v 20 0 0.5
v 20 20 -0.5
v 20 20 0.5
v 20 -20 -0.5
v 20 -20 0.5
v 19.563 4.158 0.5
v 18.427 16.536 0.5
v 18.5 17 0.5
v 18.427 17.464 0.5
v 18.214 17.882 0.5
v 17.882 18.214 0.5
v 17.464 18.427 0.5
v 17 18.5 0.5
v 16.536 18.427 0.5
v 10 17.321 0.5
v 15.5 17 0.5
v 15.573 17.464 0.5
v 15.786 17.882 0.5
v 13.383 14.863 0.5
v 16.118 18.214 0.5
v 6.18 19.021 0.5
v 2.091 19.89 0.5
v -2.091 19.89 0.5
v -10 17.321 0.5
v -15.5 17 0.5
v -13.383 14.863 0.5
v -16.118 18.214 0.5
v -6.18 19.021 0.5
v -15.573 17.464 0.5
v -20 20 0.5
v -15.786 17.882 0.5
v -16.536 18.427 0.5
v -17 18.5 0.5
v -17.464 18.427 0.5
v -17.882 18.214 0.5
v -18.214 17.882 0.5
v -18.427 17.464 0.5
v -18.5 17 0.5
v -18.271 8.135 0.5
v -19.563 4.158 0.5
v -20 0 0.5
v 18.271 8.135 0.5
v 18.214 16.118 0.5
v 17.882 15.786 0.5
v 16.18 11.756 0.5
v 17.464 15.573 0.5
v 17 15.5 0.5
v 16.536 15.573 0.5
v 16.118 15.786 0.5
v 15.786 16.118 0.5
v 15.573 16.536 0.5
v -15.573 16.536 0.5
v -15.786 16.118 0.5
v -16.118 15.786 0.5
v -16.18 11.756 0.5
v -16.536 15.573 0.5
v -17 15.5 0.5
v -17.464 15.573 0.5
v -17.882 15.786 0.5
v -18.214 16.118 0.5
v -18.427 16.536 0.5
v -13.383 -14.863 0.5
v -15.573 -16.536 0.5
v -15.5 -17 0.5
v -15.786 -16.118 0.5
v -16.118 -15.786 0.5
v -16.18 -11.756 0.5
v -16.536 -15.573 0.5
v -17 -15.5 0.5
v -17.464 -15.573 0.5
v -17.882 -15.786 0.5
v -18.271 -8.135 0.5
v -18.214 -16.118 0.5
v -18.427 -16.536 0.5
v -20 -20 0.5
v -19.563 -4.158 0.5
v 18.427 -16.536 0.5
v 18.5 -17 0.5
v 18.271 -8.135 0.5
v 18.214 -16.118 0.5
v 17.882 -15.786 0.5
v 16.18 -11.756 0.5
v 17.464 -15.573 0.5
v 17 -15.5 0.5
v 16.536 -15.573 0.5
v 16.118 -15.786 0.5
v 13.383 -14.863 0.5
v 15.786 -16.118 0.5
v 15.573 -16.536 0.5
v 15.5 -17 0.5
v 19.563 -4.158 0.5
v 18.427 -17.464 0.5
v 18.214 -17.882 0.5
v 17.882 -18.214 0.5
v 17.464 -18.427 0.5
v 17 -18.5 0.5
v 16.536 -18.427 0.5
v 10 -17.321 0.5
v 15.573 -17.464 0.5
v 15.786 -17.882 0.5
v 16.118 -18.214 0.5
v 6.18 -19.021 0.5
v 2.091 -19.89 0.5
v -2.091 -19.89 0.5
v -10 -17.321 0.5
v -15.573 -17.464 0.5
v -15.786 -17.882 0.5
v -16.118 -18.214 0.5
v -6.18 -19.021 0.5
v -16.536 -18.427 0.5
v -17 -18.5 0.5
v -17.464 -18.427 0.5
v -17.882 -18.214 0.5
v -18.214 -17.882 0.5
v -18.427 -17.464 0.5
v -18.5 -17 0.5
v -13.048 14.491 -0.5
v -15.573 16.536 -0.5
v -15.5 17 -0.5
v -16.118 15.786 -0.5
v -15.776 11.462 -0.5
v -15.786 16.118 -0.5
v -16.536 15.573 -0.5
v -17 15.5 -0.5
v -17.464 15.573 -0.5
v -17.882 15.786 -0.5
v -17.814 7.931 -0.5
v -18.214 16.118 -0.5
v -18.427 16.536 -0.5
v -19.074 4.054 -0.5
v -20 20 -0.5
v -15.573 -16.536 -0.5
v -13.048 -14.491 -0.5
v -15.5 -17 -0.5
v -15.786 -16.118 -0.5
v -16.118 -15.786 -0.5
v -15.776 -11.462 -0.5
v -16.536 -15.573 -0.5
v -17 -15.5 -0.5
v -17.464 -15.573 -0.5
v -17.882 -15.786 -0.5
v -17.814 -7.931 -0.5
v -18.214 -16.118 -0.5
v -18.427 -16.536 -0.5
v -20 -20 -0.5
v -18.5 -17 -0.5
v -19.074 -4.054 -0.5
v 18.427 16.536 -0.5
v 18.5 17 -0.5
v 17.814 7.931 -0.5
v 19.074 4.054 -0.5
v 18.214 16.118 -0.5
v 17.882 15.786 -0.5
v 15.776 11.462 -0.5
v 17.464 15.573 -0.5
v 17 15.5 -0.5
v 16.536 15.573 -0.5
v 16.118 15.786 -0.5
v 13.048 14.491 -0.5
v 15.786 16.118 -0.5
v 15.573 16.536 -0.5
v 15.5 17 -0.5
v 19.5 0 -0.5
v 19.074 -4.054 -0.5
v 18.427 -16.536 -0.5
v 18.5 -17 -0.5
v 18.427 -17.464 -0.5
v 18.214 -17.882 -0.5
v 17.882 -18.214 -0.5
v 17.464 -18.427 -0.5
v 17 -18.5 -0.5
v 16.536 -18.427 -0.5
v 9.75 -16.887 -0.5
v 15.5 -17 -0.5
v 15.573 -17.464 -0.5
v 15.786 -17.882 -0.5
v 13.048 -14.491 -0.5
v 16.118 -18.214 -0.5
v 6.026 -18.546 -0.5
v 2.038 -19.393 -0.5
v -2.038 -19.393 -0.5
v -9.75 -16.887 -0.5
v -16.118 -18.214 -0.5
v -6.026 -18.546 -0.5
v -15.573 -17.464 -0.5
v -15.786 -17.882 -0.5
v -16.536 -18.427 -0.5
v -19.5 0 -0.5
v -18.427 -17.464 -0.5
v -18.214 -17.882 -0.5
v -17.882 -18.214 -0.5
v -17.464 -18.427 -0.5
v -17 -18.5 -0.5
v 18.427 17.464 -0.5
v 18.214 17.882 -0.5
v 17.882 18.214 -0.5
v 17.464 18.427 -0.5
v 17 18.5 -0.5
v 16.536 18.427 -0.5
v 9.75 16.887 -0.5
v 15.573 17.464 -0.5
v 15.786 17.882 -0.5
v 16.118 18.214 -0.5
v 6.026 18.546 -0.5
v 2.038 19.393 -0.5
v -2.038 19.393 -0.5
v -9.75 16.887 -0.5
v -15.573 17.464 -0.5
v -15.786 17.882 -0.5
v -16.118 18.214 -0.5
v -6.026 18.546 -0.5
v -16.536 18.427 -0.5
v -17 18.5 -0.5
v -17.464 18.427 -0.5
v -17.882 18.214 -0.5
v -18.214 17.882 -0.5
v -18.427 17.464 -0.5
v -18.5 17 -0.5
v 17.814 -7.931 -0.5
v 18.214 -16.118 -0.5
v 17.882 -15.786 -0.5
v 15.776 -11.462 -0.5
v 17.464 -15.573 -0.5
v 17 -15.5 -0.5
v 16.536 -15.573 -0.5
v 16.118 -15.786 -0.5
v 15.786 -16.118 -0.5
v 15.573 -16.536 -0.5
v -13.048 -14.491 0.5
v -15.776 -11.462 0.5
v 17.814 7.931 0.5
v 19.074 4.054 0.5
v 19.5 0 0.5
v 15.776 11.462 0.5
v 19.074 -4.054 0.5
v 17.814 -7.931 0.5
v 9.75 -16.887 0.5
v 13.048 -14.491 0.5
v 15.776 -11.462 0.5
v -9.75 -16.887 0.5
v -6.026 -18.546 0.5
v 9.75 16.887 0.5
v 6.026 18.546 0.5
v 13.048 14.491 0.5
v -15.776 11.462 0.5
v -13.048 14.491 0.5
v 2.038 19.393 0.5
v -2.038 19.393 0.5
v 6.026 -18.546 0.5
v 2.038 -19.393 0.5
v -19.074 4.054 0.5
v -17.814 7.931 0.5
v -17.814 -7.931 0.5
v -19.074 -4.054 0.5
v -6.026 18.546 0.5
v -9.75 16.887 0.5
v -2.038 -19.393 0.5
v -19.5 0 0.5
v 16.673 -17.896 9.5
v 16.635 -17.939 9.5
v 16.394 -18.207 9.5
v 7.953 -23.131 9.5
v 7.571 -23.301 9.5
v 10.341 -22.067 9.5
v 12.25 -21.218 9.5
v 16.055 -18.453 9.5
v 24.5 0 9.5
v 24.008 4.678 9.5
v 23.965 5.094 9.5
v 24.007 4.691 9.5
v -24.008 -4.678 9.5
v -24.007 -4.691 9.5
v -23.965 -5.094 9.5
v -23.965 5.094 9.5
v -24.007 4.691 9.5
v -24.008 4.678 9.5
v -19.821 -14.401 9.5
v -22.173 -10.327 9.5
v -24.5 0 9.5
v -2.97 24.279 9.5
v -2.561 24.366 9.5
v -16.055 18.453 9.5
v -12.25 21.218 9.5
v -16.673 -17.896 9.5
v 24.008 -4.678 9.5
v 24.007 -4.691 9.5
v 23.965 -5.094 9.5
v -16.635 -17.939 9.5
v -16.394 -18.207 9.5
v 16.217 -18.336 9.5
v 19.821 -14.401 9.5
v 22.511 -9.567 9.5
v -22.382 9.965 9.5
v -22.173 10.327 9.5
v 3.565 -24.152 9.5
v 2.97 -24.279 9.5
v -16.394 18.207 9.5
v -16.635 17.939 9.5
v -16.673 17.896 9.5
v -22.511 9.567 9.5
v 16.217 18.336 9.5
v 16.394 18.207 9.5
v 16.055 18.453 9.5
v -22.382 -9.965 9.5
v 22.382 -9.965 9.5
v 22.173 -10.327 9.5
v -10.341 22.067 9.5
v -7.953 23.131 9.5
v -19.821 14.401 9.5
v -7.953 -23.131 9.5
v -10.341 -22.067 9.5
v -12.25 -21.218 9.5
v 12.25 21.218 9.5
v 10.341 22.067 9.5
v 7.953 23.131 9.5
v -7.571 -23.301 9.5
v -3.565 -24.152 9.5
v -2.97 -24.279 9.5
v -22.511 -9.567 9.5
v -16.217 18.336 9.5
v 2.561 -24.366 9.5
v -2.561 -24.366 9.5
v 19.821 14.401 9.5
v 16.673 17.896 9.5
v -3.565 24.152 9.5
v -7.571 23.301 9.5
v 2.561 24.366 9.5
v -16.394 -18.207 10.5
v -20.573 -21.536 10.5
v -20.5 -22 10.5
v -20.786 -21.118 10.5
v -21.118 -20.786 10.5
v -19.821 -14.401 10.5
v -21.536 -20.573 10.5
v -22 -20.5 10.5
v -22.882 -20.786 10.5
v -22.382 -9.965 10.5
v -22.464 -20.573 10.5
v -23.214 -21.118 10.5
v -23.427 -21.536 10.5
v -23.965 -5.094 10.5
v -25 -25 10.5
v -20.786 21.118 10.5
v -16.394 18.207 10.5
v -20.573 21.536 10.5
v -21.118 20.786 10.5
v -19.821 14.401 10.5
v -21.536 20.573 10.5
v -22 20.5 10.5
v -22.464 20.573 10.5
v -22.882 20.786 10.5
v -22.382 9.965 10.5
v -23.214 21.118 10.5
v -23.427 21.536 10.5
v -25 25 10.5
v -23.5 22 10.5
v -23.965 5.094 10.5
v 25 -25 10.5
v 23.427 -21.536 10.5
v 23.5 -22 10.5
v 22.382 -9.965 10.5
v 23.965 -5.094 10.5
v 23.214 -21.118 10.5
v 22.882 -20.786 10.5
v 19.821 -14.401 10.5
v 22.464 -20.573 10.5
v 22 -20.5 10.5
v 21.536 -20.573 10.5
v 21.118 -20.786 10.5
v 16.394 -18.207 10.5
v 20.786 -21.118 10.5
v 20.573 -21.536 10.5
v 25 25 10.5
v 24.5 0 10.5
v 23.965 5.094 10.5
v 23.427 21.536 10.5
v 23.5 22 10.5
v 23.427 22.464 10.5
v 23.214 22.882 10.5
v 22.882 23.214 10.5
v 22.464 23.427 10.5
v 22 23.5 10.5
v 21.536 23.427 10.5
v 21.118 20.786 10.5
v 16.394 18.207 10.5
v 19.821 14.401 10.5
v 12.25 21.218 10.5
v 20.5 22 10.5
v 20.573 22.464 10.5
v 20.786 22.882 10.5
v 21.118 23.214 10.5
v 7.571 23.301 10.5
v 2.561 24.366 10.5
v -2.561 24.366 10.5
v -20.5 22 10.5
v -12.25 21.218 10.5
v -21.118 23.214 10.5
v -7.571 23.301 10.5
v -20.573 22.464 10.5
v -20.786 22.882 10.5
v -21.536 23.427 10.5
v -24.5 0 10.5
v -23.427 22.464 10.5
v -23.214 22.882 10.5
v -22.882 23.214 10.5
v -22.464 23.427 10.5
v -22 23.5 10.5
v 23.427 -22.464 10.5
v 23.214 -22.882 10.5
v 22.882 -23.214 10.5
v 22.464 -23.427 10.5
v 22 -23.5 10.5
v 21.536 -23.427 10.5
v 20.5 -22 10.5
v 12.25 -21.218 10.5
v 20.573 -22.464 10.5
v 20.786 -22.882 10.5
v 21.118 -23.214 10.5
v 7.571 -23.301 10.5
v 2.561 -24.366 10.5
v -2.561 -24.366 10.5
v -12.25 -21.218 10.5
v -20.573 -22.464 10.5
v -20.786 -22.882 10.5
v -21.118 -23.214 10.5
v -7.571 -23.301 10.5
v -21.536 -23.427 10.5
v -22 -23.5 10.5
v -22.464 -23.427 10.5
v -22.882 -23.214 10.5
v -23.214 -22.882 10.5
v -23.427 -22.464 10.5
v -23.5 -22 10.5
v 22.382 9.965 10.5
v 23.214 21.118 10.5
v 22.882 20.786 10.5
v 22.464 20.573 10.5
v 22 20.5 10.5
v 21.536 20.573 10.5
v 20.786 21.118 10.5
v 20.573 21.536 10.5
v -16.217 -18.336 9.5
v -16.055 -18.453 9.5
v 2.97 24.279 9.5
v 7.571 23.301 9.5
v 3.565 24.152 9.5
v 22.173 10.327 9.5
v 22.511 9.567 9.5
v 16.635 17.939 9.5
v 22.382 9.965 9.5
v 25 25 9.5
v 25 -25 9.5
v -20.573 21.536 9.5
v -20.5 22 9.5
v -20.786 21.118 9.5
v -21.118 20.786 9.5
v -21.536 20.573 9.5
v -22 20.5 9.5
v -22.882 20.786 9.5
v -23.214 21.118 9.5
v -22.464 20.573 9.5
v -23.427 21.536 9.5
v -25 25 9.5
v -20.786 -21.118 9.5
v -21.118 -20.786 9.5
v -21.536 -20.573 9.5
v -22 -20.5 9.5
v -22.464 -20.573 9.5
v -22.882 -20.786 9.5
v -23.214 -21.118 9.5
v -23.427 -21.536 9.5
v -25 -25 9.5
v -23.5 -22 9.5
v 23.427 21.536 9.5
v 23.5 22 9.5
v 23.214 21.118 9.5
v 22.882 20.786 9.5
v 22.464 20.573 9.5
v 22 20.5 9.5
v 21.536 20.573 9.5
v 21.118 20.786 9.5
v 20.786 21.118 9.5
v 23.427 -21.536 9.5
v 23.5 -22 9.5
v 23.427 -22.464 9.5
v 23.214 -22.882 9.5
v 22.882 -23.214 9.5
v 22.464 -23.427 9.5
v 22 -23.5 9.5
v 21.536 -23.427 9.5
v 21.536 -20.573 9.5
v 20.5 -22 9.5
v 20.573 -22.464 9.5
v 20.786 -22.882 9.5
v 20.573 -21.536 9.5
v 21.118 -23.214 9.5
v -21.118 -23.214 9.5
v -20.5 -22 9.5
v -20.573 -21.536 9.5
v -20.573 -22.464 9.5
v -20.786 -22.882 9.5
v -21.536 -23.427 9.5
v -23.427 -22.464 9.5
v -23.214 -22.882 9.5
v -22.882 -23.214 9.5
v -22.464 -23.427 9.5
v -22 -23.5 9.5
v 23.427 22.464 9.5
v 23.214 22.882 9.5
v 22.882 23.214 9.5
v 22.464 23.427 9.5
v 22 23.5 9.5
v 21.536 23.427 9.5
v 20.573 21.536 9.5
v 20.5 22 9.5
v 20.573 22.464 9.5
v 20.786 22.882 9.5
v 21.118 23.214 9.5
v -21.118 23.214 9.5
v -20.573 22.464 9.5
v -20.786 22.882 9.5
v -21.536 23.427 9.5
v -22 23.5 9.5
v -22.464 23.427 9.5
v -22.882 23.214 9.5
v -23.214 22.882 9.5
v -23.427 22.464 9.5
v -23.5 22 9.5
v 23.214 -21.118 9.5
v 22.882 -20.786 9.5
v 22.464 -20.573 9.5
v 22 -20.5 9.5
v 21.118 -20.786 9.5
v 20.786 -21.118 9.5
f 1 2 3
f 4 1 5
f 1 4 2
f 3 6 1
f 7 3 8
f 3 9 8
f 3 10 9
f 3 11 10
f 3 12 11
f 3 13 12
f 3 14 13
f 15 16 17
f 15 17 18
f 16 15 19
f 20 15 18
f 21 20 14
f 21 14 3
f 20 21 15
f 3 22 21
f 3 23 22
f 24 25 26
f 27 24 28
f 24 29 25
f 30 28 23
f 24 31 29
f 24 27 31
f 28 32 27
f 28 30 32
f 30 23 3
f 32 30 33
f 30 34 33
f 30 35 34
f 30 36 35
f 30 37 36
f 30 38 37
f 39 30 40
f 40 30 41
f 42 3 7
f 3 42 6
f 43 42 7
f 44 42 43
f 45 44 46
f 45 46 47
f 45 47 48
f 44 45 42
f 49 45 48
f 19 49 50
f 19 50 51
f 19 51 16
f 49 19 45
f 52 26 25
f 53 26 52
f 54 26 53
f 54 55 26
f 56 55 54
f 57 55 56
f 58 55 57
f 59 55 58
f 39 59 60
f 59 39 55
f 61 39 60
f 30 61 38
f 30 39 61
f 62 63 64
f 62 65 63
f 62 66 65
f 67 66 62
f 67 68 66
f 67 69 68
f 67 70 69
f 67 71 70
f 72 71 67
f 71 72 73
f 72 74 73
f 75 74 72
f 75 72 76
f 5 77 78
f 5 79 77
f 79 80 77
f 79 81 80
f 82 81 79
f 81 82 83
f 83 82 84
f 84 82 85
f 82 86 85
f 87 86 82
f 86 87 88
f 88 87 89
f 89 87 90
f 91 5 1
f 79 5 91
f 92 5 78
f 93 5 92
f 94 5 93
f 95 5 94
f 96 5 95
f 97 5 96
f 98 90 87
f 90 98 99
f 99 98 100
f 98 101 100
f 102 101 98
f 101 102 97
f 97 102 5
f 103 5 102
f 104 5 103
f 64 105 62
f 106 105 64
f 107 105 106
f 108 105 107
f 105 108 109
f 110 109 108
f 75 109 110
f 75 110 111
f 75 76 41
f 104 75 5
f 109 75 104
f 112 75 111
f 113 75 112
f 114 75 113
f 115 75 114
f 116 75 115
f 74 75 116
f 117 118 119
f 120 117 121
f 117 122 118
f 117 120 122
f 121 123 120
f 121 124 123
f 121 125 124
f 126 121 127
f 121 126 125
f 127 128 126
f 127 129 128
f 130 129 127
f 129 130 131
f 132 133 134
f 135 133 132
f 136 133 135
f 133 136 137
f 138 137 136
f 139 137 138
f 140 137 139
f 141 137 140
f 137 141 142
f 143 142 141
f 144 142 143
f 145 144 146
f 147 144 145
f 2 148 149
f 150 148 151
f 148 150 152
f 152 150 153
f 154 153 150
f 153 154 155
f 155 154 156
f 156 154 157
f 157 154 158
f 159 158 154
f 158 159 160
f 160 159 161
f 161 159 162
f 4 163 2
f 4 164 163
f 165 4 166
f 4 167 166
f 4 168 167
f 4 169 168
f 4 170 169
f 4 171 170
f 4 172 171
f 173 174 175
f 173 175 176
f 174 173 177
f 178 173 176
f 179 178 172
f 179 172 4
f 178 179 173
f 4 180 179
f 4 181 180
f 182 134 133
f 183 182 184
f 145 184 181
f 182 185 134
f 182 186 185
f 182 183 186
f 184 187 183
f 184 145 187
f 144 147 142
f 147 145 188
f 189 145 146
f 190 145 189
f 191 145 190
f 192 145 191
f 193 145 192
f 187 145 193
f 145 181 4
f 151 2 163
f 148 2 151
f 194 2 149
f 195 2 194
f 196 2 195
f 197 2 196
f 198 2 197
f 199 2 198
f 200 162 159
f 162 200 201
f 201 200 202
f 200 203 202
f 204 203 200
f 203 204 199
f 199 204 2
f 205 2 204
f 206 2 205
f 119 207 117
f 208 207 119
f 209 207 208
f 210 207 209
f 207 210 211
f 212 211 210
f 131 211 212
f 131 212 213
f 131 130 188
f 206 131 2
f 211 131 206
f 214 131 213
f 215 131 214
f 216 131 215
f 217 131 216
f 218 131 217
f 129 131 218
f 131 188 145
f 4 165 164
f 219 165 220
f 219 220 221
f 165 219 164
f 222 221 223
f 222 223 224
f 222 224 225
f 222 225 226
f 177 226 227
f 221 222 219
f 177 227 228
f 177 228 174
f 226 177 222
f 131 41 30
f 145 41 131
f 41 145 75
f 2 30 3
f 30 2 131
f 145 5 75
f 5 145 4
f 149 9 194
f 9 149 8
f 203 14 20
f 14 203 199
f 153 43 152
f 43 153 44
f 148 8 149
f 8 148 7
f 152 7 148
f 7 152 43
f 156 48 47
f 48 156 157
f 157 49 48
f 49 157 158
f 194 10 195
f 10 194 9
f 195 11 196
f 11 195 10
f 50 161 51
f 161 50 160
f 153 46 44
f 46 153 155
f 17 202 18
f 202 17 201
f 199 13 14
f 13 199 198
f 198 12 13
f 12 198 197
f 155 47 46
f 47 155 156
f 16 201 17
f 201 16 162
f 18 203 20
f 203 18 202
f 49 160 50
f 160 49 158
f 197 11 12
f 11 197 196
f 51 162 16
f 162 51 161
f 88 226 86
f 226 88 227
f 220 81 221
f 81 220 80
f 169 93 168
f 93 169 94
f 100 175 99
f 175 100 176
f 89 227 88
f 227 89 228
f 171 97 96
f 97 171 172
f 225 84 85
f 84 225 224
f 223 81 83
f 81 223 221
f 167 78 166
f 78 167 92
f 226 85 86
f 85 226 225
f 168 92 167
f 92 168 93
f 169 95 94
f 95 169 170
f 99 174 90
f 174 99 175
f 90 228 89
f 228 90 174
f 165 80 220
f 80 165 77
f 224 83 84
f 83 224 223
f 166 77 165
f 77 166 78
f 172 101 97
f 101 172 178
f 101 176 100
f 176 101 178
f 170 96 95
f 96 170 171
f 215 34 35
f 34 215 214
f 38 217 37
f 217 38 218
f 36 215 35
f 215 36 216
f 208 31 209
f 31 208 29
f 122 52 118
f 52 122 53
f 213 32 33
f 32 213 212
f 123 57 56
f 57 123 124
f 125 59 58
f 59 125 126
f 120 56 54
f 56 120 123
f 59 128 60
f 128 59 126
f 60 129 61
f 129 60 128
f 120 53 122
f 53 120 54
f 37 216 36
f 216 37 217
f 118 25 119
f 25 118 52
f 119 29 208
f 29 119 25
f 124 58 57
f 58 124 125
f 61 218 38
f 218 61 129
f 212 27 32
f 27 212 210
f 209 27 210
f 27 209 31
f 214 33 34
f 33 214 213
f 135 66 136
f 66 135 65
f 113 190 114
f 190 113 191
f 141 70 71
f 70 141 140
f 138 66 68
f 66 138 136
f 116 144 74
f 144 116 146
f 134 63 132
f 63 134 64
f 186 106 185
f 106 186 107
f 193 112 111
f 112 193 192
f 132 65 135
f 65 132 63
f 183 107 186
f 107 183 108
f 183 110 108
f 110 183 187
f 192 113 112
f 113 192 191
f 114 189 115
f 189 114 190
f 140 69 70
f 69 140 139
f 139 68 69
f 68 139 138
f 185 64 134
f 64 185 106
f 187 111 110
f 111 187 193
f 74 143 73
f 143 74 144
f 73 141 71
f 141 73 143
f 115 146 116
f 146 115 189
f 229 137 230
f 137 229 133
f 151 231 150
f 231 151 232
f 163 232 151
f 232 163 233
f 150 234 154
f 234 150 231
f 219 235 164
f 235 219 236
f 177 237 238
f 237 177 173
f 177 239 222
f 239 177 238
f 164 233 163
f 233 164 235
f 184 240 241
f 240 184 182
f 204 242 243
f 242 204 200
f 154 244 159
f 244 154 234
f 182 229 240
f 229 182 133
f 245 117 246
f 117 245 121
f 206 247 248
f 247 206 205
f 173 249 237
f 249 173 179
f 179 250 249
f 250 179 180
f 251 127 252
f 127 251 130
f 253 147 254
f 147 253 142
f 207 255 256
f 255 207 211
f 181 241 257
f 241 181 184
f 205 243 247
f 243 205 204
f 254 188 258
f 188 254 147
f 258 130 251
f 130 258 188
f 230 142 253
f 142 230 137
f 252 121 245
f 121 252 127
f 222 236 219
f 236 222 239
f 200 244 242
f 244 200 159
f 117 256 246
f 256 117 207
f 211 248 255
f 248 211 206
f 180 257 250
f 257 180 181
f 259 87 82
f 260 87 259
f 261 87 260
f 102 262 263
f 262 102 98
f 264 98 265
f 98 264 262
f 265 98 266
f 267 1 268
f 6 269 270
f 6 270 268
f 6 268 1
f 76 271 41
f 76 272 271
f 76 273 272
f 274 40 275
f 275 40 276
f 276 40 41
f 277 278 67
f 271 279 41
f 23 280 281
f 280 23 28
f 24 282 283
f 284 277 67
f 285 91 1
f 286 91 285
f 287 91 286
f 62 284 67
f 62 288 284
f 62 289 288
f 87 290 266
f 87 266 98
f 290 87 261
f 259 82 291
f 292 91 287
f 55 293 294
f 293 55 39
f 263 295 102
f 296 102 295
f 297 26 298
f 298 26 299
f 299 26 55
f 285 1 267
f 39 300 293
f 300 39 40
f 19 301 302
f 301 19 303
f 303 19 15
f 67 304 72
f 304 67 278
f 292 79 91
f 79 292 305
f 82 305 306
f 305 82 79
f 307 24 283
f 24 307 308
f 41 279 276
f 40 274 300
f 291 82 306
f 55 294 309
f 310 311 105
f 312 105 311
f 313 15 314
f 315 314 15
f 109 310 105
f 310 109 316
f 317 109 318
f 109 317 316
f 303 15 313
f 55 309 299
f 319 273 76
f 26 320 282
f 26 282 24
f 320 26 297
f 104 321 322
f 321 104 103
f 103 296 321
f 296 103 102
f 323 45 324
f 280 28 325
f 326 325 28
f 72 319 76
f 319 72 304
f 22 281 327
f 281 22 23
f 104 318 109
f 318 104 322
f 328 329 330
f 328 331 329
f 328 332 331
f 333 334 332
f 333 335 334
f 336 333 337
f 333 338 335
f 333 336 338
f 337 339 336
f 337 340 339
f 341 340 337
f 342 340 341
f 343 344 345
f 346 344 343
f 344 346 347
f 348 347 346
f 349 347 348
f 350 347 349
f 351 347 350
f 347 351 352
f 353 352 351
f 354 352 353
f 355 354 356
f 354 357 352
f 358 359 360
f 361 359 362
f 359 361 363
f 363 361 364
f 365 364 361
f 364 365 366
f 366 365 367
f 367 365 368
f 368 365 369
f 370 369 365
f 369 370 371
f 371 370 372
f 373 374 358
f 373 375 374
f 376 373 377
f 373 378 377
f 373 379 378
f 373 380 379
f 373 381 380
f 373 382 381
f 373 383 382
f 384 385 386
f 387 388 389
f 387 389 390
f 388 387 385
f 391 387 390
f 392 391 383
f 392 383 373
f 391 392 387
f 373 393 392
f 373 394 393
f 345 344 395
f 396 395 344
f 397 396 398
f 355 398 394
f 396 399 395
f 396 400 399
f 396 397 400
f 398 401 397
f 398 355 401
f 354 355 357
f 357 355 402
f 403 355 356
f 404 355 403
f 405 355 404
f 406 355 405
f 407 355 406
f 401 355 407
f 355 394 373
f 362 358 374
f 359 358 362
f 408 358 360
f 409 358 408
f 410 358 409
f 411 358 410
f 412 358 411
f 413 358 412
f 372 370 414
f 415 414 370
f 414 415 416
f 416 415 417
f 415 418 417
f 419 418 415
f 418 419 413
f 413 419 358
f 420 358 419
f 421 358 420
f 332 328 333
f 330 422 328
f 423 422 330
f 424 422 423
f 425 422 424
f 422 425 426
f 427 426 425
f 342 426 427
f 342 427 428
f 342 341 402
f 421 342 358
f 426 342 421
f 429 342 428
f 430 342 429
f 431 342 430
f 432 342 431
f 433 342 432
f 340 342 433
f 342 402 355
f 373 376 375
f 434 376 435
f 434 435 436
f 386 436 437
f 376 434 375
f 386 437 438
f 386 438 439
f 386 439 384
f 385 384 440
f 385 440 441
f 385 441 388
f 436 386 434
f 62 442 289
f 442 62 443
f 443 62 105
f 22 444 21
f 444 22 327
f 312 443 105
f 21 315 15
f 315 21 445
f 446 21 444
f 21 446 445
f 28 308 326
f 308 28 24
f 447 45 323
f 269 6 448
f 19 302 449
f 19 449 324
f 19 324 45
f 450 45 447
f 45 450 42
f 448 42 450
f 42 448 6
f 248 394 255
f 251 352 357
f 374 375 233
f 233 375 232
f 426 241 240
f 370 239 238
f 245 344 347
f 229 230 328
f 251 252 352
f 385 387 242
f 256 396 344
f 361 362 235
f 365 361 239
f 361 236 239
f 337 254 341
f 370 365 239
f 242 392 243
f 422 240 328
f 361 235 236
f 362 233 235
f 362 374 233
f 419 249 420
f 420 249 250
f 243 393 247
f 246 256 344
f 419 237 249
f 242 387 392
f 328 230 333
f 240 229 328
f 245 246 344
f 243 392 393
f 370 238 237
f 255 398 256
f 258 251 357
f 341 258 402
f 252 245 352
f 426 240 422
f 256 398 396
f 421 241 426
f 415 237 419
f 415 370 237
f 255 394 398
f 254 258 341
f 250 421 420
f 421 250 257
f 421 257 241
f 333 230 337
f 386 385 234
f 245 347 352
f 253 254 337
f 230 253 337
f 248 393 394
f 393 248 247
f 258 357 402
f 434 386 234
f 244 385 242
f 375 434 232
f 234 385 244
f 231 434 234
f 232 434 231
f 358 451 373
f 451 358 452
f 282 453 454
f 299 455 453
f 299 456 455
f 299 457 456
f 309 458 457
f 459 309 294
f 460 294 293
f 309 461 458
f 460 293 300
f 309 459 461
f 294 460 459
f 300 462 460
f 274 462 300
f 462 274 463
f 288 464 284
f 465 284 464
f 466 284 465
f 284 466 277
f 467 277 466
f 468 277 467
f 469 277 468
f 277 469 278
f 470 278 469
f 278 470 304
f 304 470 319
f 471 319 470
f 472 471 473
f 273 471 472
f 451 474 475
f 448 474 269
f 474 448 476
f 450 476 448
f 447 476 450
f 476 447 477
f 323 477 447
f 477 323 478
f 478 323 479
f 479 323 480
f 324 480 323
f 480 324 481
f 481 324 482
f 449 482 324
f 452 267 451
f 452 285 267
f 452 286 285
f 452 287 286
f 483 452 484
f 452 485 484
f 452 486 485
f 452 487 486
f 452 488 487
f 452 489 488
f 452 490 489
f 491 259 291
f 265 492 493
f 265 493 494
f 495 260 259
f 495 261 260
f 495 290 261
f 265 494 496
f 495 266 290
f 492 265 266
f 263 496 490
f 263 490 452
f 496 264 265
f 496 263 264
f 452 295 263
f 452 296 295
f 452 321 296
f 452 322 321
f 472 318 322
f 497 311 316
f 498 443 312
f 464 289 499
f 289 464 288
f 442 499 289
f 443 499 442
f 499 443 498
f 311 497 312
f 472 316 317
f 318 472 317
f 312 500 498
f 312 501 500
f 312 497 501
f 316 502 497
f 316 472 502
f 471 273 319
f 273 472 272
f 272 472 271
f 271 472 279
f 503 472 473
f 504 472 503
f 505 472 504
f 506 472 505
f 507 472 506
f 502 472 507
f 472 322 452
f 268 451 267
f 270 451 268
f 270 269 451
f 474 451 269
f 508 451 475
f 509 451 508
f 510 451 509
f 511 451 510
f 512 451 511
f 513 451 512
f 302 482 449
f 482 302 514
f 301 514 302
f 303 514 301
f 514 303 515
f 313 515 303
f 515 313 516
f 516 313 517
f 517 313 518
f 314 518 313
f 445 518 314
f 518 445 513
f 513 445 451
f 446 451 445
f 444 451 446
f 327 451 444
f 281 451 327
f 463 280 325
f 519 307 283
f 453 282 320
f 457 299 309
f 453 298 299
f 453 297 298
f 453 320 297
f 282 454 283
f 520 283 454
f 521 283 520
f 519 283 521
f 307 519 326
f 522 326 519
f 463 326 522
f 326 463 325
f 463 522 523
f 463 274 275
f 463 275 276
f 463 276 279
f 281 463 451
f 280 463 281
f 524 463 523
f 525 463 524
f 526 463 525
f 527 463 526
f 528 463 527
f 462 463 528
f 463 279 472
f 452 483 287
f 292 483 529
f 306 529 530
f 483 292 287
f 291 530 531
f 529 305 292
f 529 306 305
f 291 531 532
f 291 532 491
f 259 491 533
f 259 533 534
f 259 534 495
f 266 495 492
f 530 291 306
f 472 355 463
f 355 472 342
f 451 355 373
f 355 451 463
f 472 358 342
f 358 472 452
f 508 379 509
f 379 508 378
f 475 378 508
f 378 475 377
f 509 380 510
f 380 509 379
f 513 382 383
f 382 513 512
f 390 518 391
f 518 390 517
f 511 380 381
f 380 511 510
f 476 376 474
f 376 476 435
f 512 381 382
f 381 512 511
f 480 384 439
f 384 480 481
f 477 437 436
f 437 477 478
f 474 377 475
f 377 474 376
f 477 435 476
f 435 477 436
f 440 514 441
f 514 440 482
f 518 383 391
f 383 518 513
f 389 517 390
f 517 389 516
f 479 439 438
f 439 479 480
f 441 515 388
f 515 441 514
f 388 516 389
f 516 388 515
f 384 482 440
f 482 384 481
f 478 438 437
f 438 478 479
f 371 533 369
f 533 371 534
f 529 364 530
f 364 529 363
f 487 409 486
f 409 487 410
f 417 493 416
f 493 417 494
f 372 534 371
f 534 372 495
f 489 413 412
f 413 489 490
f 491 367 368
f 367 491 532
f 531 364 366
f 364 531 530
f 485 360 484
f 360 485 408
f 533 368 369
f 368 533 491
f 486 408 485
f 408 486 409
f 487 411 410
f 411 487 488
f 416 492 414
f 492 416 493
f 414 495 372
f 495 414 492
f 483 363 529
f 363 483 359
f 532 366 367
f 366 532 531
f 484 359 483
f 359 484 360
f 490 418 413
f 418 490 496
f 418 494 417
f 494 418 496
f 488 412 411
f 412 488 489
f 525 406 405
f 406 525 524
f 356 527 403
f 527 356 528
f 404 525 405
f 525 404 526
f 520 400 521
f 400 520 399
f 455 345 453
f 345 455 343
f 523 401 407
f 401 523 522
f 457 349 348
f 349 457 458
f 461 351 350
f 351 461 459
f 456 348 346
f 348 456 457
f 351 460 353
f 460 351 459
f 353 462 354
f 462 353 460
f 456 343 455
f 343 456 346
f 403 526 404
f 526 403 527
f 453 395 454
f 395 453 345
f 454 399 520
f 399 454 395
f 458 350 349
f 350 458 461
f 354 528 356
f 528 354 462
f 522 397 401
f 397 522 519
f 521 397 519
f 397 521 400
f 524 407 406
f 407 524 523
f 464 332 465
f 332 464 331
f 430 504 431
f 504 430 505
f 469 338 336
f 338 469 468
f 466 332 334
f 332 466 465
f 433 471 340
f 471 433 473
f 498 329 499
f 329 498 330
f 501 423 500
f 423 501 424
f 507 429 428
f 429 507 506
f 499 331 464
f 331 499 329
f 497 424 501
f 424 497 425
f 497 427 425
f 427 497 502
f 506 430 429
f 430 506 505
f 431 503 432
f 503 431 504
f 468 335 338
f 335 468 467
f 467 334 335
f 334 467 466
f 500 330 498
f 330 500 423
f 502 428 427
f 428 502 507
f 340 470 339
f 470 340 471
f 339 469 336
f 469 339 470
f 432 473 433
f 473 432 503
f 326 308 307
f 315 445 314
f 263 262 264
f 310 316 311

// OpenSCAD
module screw_hole(radius=1.5, offset=17) {
  translate([offset,offset,0]) {
    cylinder(h=2, r=radius, center=true, $fn=20);
  }
}

module tube(height=10, d1=40, d2=50, thickness=1) {
  difference() {
    cylinder(h=height, d1=d1, d2=d2, center=true);
    cylinder(h=height, d1=d1-thickness, d2=d2-thickness, center=true);
  }
}
union() {
  union() {
    difference() {
      difference() {
        cube([40, 40, 1], center=true);
        mirror([0,0,0]) screw_hole();
        mirror([0,1,0]) screw_hole();
        mirror([1,0,0]) screw_hole();
        mirror([1,1,0]) screw_hole();
      }
      cylinder(d=39, h=1, center=true);
    }
    translate([0,0,5.5]) tube();
  }
  translate([0,0,10]) {
    difference() {
      difference() {
        cube([50, 50, 1], center=true);
        mirror([0,0,0]) screw_hole(offset=22);
        mirror([0,1,0]) screw_hole(offset=22);
        mirror([1,0,0]) screw_hole(offset=22);
        mirror([1,1,0]) screw_hole(offset=22);
      }
      cylinder(d=49, h=1, center=true);
    }
  }
}
